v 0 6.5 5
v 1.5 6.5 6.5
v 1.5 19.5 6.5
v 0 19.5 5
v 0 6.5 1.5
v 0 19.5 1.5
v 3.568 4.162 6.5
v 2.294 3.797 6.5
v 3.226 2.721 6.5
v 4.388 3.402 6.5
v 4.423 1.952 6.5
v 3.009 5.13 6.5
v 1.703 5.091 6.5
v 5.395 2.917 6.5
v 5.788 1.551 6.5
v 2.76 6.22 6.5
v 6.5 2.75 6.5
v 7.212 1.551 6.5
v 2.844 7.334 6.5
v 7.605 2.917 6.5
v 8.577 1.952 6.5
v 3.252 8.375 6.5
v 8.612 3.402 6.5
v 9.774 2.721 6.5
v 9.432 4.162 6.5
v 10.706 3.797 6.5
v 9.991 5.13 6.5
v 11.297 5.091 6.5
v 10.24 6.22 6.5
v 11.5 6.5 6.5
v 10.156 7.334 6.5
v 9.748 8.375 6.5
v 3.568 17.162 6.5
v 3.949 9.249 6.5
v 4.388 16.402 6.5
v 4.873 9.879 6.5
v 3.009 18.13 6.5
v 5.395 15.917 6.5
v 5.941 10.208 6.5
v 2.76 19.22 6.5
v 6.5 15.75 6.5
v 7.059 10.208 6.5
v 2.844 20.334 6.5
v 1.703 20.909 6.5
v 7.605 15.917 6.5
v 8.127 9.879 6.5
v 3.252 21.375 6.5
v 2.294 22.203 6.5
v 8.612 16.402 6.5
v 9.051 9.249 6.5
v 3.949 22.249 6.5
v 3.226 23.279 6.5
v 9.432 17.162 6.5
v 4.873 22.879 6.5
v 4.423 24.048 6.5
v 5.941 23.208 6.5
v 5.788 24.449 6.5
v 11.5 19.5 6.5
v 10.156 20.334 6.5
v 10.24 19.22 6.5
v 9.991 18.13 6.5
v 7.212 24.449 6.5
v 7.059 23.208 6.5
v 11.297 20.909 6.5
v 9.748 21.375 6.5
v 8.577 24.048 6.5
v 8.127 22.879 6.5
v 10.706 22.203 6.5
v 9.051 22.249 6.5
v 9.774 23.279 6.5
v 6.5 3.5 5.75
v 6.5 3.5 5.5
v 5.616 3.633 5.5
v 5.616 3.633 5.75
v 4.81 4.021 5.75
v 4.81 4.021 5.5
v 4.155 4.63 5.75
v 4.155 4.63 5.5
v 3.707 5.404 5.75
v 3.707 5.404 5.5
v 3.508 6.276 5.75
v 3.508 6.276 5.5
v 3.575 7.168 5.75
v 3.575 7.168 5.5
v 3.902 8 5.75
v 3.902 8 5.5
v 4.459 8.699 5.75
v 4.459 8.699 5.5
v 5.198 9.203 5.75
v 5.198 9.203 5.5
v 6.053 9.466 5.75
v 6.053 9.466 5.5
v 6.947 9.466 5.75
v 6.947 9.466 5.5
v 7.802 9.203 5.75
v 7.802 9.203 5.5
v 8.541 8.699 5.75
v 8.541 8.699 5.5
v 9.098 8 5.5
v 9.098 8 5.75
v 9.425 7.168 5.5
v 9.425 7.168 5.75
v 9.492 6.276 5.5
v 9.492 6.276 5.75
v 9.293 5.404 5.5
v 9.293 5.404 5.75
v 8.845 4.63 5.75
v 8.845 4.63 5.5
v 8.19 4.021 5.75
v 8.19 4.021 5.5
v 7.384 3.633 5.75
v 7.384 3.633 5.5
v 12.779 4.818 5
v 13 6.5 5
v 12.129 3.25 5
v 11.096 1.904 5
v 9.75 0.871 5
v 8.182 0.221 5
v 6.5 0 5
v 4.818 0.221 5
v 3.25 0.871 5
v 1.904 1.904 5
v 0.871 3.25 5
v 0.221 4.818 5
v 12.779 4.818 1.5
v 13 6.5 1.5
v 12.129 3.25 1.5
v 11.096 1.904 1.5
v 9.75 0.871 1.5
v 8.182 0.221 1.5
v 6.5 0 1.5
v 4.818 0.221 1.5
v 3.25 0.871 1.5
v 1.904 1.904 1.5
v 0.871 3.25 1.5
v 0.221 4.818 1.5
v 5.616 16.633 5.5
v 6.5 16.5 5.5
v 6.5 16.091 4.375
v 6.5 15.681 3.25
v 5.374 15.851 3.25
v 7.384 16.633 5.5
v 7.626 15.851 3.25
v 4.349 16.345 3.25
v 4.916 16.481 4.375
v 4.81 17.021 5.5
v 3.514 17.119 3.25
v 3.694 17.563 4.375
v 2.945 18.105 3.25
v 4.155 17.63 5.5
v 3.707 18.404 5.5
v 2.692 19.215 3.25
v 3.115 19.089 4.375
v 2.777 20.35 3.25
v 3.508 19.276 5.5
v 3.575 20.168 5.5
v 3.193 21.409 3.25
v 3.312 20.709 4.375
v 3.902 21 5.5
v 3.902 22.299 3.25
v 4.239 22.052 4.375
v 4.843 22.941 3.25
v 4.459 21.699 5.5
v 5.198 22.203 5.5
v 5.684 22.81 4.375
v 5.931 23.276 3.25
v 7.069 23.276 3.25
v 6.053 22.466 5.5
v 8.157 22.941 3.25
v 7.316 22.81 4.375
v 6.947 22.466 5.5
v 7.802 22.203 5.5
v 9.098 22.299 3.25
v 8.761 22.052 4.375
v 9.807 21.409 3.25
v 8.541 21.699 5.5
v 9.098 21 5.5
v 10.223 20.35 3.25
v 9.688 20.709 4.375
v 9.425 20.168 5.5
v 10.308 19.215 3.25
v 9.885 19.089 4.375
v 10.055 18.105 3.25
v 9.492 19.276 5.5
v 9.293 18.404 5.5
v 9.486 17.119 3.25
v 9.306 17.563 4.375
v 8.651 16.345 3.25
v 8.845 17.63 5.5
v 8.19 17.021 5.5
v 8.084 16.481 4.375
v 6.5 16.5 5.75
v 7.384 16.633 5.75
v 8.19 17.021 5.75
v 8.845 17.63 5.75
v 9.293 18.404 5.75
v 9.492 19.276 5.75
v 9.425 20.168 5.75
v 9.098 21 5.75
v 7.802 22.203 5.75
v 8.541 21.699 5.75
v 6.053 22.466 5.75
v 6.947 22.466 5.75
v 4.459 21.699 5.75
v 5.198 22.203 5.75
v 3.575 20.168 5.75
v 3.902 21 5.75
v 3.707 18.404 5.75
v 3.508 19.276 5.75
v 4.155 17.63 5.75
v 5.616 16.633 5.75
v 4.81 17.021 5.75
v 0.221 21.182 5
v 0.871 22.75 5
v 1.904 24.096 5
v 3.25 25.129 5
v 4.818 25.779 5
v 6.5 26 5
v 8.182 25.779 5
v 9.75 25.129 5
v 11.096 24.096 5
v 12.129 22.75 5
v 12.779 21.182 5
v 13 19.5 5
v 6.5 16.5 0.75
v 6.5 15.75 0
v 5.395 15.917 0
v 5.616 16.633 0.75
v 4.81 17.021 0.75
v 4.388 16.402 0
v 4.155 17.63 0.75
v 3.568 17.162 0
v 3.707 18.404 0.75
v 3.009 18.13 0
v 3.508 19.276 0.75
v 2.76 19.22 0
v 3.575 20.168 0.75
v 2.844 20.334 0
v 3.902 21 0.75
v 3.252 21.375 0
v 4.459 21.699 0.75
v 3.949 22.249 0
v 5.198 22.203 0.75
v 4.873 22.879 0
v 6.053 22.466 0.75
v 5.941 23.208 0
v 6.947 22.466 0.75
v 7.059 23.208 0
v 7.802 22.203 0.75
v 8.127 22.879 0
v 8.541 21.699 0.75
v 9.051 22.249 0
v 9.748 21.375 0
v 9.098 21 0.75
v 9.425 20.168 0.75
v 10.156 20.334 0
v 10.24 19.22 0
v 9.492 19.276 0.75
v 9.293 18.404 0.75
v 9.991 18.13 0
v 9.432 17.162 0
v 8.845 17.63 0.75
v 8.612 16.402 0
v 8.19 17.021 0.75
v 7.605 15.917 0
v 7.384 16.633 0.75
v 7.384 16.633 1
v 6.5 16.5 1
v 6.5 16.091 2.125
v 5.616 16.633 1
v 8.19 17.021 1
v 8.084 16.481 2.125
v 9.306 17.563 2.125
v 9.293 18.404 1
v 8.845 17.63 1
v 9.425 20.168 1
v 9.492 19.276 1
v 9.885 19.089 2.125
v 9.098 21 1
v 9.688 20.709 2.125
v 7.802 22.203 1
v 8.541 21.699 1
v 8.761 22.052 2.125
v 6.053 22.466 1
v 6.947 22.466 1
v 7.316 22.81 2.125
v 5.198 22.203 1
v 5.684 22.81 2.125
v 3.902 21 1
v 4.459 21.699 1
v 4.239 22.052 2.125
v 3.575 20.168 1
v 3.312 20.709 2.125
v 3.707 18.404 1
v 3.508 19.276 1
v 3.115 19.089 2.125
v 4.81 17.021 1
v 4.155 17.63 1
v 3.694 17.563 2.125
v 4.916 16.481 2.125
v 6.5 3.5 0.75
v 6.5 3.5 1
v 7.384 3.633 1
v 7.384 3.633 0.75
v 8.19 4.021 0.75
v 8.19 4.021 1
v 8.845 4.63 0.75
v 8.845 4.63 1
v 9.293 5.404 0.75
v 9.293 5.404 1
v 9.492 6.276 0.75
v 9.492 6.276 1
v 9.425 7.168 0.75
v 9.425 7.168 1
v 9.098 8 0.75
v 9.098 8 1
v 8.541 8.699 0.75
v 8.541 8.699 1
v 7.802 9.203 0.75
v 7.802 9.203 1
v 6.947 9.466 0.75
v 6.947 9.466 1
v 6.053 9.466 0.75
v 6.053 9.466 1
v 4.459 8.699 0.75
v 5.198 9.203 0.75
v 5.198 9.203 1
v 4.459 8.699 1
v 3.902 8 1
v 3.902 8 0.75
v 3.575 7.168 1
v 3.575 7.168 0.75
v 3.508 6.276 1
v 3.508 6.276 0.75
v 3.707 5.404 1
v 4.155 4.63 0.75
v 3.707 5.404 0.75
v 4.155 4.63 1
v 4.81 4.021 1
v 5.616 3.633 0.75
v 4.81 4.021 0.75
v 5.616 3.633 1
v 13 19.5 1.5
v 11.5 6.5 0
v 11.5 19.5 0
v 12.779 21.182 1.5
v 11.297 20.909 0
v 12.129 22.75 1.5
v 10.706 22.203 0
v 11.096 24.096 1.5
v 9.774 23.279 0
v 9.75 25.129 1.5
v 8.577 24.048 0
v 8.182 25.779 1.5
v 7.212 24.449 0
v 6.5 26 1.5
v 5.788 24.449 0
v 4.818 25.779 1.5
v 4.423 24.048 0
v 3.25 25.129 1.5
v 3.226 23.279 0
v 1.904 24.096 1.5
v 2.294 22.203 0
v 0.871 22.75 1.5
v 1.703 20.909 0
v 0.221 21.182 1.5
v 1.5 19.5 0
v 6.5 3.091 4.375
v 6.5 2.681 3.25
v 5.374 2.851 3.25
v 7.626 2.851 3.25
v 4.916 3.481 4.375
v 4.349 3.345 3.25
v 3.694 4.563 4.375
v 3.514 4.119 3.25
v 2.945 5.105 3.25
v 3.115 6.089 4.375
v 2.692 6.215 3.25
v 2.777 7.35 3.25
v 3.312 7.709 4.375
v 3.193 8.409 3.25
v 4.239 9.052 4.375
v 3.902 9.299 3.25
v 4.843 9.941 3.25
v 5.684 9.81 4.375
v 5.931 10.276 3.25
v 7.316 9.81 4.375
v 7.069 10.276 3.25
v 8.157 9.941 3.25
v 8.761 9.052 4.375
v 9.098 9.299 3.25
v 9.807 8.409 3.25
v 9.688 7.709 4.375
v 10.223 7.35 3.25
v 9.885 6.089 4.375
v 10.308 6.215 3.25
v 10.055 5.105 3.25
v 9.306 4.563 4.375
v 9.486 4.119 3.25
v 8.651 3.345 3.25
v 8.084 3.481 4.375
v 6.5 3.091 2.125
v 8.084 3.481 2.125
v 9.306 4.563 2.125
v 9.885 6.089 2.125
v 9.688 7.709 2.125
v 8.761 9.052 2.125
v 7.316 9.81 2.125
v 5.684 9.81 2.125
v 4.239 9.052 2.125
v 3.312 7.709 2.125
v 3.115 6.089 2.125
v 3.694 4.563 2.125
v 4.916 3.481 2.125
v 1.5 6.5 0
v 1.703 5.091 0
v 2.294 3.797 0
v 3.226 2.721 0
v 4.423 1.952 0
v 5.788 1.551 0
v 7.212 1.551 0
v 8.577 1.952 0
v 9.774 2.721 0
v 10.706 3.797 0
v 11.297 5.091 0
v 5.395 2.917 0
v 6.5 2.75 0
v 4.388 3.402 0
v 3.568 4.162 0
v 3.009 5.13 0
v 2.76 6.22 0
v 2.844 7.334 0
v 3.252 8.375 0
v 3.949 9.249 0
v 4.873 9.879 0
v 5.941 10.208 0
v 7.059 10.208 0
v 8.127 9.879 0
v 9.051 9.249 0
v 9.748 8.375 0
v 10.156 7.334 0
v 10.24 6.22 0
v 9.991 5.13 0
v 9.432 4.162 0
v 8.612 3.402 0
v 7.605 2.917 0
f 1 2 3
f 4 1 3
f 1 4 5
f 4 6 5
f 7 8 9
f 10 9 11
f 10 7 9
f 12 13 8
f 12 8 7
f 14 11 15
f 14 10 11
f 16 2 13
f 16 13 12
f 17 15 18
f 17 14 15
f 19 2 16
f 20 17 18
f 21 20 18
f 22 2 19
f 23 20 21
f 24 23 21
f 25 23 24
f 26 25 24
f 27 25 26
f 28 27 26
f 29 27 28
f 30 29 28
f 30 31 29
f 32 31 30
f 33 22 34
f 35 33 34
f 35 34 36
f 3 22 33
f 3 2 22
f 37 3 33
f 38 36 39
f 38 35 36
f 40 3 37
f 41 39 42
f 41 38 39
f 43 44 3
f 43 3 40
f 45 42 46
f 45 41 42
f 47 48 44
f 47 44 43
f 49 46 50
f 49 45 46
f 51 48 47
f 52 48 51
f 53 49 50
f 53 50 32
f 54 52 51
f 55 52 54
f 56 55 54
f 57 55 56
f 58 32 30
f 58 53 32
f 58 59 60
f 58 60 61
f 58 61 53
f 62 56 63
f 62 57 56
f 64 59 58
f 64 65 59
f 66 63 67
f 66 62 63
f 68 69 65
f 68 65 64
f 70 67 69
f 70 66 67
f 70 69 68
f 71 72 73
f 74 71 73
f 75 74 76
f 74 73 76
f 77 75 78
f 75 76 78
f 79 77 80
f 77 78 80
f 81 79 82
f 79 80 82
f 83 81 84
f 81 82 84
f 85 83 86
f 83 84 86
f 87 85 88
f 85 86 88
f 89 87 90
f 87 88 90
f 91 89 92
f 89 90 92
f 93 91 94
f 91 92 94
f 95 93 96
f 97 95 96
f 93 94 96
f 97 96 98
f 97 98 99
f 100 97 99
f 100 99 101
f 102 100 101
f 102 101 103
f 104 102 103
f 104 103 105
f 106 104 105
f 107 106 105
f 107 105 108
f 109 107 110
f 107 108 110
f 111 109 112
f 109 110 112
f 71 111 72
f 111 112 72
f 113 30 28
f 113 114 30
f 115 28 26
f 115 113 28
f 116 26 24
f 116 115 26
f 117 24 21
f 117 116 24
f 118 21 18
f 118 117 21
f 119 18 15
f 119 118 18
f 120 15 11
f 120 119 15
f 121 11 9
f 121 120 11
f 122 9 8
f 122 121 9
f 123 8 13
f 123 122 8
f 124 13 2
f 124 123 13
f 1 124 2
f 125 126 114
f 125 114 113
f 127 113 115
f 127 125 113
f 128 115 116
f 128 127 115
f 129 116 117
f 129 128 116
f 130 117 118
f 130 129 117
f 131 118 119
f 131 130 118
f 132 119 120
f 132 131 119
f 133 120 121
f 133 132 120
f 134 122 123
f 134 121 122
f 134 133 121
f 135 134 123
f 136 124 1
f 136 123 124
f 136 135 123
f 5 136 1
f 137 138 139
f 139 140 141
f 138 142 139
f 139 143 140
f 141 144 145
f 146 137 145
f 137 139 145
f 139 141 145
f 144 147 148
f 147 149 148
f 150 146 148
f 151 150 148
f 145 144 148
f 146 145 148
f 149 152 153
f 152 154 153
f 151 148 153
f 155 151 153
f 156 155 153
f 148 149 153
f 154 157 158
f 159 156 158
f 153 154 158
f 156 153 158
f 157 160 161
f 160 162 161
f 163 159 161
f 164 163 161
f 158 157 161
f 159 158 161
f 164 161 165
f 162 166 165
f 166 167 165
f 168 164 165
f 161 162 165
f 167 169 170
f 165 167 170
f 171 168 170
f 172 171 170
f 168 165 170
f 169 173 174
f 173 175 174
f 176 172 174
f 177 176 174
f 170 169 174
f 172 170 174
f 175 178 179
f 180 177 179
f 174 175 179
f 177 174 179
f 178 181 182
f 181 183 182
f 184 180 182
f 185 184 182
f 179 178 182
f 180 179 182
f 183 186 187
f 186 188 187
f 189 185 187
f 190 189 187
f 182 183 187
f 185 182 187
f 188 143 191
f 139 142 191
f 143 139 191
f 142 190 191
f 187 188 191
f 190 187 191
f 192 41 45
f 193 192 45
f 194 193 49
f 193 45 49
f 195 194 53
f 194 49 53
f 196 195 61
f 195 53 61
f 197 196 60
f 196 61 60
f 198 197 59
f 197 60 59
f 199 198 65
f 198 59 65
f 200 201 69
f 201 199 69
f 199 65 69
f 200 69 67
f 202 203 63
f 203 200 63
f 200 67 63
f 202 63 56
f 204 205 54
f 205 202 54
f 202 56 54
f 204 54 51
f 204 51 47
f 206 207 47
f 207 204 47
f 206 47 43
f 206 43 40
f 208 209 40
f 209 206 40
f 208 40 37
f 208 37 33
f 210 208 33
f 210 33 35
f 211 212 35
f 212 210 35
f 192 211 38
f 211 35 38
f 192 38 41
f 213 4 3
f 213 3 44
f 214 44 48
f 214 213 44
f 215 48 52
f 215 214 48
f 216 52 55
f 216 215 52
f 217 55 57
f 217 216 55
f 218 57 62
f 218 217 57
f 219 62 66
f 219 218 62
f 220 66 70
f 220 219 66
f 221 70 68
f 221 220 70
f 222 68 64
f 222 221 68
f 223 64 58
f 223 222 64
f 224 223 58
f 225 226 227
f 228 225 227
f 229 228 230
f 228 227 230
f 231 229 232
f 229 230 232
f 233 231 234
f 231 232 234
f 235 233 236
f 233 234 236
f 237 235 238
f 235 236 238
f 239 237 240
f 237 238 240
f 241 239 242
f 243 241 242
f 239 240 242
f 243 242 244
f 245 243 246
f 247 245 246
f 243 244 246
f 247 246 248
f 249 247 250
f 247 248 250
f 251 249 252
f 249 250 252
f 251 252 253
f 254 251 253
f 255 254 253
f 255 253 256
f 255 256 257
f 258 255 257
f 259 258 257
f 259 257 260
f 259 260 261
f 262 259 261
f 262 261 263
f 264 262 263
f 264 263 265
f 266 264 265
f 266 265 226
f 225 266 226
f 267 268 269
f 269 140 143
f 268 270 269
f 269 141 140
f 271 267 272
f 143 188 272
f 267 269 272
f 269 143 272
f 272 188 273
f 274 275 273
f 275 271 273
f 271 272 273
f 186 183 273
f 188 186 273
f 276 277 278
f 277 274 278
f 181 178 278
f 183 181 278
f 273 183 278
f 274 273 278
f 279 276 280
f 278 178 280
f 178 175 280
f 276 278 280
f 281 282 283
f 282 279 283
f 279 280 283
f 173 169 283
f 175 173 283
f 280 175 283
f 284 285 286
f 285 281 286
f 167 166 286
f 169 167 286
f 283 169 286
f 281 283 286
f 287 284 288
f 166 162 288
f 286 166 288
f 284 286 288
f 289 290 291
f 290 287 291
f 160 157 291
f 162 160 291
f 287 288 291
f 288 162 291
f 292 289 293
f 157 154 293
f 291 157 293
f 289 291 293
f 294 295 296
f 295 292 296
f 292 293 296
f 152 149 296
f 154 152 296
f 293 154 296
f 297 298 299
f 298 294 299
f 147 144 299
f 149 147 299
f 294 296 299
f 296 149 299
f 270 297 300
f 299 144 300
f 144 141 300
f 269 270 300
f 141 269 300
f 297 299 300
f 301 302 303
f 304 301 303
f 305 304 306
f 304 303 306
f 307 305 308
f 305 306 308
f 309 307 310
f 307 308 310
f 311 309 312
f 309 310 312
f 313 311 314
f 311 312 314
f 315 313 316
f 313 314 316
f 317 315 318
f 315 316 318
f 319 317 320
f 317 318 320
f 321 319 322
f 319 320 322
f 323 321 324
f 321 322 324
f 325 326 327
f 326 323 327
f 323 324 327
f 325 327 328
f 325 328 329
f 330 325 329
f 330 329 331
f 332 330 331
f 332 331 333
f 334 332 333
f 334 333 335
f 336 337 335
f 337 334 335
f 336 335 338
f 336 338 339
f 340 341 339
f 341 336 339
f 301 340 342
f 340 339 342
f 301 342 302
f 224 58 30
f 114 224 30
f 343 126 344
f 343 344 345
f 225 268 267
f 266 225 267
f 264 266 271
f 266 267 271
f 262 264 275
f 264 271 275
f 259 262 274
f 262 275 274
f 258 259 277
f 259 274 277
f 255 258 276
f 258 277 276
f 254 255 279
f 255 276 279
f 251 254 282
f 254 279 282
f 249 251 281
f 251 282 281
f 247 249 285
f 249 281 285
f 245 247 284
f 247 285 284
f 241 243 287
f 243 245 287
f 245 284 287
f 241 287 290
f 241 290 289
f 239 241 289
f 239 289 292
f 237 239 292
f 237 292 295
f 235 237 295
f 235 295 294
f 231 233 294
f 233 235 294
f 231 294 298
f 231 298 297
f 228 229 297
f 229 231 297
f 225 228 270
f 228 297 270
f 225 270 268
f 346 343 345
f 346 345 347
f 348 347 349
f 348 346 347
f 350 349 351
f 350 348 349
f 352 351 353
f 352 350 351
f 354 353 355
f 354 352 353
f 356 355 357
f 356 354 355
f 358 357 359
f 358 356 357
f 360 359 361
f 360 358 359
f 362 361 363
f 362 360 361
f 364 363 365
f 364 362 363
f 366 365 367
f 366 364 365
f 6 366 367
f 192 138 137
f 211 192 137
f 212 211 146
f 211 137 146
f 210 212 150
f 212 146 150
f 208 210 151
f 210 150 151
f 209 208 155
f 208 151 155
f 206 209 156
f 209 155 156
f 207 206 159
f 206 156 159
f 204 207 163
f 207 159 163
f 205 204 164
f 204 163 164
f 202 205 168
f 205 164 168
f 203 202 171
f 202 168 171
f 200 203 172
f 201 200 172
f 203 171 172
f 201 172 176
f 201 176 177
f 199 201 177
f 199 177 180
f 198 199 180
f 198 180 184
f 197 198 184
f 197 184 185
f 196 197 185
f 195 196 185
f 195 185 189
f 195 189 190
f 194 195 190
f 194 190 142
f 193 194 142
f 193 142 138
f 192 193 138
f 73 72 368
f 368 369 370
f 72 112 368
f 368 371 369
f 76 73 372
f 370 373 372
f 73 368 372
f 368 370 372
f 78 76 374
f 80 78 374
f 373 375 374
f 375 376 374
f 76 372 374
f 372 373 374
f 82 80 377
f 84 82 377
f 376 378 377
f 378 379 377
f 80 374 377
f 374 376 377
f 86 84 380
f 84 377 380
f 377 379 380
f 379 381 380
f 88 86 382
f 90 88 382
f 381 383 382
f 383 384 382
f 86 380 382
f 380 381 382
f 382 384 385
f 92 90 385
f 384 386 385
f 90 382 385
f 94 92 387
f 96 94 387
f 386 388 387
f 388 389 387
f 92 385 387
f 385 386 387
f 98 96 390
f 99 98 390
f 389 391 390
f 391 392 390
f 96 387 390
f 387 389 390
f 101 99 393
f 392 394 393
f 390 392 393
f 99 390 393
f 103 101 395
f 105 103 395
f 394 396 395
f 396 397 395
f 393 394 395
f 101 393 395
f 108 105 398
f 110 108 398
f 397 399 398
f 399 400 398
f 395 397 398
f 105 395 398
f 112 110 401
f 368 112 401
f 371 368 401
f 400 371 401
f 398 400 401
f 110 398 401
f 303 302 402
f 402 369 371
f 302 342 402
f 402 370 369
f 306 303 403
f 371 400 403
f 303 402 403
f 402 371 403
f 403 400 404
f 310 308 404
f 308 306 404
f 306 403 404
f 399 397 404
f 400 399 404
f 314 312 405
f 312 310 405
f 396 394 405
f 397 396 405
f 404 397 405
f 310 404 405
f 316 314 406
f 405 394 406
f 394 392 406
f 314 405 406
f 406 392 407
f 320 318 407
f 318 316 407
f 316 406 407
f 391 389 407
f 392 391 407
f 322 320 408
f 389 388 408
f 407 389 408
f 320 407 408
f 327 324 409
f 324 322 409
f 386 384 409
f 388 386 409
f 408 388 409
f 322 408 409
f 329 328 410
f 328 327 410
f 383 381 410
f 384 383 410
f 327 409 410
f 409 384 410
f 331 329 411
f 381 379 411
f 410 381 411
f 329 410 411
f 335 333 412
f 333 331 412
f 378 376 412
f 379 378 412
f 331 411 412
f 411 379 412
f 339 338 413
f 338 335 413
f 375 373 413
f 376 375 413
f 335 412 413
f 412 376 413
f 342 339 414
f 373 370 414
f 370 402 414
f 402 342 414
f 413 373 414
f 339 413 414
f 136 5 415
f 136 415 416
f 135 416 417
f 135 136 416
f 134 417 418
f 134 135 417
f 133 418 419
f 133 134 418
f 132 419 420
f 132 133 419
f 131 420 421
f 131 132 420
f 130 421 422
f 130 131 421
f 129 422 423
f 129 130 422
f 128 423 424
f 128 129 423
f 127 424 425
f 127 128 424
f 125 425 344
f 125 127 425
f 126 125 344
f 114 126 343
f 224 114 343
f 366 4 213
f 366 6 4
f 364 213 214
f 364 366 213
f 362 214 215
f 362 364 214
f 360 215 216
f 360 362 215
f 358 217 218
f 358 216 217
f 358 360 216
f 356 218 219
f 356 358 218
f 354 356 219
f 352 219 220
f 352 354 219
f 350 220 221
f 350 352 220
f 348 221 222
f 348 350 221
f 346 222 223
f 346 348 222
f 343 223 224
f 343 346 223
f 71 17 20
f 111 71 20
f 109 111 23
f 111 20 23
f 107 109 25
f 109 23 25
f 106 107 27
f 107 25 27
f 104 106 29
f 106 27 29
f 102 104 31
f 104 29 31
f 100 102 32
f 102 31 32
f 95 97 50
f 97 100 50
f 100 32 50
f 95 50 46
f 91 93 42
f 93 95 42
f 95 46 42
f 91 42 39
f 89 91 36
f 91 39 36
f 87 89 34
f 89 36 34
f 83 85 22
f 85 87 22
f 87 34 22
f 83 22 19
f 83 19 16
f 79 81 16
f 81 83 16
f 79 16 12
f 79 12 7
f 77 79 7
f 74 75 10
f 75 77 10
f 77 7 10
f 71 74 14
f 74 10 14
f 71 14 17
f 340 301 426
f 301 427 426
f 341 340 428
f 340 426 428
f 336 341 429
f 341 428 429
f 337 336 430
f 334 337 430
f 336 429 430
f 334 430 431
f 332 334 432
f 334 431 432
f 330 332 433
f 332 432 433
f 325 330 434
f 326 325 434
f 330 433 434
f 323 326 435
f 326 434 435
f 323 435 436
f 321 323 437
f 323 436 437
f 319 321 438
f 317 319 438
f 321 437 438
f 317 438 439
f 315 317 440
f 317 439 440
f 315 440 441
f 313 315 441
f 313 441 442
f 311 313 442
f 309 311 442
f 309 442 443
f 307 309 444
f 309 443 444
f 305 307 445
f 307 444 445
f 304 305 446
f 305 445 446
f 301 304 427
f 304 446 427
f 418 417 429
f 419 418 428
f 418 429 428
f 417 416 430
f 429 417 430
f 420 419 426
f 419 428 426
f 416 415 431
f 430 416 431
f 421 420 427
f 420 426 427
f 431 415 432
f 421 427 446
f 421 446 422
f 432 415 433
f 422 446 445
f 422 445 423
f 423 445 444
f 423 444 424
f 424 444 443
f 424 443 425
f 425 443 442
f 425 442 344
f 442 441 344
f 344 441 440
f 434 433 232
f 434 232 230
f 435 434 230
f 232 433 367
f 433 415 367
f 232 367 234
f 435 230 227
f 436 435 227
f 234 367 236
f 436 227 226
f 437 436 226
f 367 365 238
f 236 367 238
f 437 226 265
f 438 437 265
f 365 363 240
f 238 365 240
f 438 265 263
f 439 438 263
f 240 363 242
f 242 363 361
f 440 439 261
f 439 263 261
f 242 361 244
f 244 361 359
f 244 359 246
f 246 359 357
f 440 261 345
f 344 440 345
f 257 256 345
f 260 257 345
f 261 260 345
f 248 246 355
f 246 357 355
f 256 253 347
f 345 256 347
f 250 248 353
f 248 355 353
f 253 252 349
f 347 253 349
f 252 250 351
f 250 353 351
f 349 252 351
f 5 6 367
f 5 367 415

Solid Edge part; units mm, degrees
sketch "Sketch1" plane through (0, 0, 0) normal (0, 0, 1) x (1, 0, 0)
  line L0 (0, 19.5) -> (0, 6.5)
  line L1 (13, 6.5) -> (13, 19.5)
  arc A0 (13, 6.5) -> (0, 6.5) centre (6.5, 6.5) cw
  arc A1 (0, 19.5) -> (13, 19.5) centre (6.5, 19.5) cw
extrude "Protrusion1" add sketch "Sketch1" along normal blind 6.5
sketch "Sketch2" plane through (6.5, 0, 0) normal (1, 0, 0) x (0, 1, 0)
  line L0 (3.5, 0) -> (3.5, 1)
  line L1 (3.5, 1) -> (2.6811, 3.25)
  line L2 (3.5, 5.5) -> (2.6811, 3.25)
  line L3 (3.5, 6.5) -> (3.5, 5.5)
  line L4 (6.5, 6.5) -> (3.5, 6.5)
  line L5 (6.5, 6.5) -> (6.5, 0)
  line L6 (3.5, 0) -> (6.5, 0)
  dimension "D1" = 3
  dimension "D2" = 1
  dimension "D3" = 2.3944
  dimension "D4" = 1.5731
  dimension "D5" = 6.5
revolve "RevolvedCutout1" cut sketch "Sketch2" angle 360 about axis through (6.5, 6.5, 6.5) along (0, 0, -1)
chamfer "Chaflán_2" distance 0.75 angle 45 2 edges at (9.5, 6.5, 6.5) (9.5, 6.5, 0)
pattern_linear "Pattern1" count 2 spacing 13 along (0, 1, 0) of "RevolvedCutout1", "Chaflán_2"
chamfer "Chaflán_37" distance 1.5 angle 45 8 edges at (0, 13, 0) (6.5, 26, 0) (13, 13, 0) (6.5, 0, 0) (0, 13, 6.5) (6.5, 26, 6.5) (13, 13, 6.5) (6.5, 0, 6.5)
